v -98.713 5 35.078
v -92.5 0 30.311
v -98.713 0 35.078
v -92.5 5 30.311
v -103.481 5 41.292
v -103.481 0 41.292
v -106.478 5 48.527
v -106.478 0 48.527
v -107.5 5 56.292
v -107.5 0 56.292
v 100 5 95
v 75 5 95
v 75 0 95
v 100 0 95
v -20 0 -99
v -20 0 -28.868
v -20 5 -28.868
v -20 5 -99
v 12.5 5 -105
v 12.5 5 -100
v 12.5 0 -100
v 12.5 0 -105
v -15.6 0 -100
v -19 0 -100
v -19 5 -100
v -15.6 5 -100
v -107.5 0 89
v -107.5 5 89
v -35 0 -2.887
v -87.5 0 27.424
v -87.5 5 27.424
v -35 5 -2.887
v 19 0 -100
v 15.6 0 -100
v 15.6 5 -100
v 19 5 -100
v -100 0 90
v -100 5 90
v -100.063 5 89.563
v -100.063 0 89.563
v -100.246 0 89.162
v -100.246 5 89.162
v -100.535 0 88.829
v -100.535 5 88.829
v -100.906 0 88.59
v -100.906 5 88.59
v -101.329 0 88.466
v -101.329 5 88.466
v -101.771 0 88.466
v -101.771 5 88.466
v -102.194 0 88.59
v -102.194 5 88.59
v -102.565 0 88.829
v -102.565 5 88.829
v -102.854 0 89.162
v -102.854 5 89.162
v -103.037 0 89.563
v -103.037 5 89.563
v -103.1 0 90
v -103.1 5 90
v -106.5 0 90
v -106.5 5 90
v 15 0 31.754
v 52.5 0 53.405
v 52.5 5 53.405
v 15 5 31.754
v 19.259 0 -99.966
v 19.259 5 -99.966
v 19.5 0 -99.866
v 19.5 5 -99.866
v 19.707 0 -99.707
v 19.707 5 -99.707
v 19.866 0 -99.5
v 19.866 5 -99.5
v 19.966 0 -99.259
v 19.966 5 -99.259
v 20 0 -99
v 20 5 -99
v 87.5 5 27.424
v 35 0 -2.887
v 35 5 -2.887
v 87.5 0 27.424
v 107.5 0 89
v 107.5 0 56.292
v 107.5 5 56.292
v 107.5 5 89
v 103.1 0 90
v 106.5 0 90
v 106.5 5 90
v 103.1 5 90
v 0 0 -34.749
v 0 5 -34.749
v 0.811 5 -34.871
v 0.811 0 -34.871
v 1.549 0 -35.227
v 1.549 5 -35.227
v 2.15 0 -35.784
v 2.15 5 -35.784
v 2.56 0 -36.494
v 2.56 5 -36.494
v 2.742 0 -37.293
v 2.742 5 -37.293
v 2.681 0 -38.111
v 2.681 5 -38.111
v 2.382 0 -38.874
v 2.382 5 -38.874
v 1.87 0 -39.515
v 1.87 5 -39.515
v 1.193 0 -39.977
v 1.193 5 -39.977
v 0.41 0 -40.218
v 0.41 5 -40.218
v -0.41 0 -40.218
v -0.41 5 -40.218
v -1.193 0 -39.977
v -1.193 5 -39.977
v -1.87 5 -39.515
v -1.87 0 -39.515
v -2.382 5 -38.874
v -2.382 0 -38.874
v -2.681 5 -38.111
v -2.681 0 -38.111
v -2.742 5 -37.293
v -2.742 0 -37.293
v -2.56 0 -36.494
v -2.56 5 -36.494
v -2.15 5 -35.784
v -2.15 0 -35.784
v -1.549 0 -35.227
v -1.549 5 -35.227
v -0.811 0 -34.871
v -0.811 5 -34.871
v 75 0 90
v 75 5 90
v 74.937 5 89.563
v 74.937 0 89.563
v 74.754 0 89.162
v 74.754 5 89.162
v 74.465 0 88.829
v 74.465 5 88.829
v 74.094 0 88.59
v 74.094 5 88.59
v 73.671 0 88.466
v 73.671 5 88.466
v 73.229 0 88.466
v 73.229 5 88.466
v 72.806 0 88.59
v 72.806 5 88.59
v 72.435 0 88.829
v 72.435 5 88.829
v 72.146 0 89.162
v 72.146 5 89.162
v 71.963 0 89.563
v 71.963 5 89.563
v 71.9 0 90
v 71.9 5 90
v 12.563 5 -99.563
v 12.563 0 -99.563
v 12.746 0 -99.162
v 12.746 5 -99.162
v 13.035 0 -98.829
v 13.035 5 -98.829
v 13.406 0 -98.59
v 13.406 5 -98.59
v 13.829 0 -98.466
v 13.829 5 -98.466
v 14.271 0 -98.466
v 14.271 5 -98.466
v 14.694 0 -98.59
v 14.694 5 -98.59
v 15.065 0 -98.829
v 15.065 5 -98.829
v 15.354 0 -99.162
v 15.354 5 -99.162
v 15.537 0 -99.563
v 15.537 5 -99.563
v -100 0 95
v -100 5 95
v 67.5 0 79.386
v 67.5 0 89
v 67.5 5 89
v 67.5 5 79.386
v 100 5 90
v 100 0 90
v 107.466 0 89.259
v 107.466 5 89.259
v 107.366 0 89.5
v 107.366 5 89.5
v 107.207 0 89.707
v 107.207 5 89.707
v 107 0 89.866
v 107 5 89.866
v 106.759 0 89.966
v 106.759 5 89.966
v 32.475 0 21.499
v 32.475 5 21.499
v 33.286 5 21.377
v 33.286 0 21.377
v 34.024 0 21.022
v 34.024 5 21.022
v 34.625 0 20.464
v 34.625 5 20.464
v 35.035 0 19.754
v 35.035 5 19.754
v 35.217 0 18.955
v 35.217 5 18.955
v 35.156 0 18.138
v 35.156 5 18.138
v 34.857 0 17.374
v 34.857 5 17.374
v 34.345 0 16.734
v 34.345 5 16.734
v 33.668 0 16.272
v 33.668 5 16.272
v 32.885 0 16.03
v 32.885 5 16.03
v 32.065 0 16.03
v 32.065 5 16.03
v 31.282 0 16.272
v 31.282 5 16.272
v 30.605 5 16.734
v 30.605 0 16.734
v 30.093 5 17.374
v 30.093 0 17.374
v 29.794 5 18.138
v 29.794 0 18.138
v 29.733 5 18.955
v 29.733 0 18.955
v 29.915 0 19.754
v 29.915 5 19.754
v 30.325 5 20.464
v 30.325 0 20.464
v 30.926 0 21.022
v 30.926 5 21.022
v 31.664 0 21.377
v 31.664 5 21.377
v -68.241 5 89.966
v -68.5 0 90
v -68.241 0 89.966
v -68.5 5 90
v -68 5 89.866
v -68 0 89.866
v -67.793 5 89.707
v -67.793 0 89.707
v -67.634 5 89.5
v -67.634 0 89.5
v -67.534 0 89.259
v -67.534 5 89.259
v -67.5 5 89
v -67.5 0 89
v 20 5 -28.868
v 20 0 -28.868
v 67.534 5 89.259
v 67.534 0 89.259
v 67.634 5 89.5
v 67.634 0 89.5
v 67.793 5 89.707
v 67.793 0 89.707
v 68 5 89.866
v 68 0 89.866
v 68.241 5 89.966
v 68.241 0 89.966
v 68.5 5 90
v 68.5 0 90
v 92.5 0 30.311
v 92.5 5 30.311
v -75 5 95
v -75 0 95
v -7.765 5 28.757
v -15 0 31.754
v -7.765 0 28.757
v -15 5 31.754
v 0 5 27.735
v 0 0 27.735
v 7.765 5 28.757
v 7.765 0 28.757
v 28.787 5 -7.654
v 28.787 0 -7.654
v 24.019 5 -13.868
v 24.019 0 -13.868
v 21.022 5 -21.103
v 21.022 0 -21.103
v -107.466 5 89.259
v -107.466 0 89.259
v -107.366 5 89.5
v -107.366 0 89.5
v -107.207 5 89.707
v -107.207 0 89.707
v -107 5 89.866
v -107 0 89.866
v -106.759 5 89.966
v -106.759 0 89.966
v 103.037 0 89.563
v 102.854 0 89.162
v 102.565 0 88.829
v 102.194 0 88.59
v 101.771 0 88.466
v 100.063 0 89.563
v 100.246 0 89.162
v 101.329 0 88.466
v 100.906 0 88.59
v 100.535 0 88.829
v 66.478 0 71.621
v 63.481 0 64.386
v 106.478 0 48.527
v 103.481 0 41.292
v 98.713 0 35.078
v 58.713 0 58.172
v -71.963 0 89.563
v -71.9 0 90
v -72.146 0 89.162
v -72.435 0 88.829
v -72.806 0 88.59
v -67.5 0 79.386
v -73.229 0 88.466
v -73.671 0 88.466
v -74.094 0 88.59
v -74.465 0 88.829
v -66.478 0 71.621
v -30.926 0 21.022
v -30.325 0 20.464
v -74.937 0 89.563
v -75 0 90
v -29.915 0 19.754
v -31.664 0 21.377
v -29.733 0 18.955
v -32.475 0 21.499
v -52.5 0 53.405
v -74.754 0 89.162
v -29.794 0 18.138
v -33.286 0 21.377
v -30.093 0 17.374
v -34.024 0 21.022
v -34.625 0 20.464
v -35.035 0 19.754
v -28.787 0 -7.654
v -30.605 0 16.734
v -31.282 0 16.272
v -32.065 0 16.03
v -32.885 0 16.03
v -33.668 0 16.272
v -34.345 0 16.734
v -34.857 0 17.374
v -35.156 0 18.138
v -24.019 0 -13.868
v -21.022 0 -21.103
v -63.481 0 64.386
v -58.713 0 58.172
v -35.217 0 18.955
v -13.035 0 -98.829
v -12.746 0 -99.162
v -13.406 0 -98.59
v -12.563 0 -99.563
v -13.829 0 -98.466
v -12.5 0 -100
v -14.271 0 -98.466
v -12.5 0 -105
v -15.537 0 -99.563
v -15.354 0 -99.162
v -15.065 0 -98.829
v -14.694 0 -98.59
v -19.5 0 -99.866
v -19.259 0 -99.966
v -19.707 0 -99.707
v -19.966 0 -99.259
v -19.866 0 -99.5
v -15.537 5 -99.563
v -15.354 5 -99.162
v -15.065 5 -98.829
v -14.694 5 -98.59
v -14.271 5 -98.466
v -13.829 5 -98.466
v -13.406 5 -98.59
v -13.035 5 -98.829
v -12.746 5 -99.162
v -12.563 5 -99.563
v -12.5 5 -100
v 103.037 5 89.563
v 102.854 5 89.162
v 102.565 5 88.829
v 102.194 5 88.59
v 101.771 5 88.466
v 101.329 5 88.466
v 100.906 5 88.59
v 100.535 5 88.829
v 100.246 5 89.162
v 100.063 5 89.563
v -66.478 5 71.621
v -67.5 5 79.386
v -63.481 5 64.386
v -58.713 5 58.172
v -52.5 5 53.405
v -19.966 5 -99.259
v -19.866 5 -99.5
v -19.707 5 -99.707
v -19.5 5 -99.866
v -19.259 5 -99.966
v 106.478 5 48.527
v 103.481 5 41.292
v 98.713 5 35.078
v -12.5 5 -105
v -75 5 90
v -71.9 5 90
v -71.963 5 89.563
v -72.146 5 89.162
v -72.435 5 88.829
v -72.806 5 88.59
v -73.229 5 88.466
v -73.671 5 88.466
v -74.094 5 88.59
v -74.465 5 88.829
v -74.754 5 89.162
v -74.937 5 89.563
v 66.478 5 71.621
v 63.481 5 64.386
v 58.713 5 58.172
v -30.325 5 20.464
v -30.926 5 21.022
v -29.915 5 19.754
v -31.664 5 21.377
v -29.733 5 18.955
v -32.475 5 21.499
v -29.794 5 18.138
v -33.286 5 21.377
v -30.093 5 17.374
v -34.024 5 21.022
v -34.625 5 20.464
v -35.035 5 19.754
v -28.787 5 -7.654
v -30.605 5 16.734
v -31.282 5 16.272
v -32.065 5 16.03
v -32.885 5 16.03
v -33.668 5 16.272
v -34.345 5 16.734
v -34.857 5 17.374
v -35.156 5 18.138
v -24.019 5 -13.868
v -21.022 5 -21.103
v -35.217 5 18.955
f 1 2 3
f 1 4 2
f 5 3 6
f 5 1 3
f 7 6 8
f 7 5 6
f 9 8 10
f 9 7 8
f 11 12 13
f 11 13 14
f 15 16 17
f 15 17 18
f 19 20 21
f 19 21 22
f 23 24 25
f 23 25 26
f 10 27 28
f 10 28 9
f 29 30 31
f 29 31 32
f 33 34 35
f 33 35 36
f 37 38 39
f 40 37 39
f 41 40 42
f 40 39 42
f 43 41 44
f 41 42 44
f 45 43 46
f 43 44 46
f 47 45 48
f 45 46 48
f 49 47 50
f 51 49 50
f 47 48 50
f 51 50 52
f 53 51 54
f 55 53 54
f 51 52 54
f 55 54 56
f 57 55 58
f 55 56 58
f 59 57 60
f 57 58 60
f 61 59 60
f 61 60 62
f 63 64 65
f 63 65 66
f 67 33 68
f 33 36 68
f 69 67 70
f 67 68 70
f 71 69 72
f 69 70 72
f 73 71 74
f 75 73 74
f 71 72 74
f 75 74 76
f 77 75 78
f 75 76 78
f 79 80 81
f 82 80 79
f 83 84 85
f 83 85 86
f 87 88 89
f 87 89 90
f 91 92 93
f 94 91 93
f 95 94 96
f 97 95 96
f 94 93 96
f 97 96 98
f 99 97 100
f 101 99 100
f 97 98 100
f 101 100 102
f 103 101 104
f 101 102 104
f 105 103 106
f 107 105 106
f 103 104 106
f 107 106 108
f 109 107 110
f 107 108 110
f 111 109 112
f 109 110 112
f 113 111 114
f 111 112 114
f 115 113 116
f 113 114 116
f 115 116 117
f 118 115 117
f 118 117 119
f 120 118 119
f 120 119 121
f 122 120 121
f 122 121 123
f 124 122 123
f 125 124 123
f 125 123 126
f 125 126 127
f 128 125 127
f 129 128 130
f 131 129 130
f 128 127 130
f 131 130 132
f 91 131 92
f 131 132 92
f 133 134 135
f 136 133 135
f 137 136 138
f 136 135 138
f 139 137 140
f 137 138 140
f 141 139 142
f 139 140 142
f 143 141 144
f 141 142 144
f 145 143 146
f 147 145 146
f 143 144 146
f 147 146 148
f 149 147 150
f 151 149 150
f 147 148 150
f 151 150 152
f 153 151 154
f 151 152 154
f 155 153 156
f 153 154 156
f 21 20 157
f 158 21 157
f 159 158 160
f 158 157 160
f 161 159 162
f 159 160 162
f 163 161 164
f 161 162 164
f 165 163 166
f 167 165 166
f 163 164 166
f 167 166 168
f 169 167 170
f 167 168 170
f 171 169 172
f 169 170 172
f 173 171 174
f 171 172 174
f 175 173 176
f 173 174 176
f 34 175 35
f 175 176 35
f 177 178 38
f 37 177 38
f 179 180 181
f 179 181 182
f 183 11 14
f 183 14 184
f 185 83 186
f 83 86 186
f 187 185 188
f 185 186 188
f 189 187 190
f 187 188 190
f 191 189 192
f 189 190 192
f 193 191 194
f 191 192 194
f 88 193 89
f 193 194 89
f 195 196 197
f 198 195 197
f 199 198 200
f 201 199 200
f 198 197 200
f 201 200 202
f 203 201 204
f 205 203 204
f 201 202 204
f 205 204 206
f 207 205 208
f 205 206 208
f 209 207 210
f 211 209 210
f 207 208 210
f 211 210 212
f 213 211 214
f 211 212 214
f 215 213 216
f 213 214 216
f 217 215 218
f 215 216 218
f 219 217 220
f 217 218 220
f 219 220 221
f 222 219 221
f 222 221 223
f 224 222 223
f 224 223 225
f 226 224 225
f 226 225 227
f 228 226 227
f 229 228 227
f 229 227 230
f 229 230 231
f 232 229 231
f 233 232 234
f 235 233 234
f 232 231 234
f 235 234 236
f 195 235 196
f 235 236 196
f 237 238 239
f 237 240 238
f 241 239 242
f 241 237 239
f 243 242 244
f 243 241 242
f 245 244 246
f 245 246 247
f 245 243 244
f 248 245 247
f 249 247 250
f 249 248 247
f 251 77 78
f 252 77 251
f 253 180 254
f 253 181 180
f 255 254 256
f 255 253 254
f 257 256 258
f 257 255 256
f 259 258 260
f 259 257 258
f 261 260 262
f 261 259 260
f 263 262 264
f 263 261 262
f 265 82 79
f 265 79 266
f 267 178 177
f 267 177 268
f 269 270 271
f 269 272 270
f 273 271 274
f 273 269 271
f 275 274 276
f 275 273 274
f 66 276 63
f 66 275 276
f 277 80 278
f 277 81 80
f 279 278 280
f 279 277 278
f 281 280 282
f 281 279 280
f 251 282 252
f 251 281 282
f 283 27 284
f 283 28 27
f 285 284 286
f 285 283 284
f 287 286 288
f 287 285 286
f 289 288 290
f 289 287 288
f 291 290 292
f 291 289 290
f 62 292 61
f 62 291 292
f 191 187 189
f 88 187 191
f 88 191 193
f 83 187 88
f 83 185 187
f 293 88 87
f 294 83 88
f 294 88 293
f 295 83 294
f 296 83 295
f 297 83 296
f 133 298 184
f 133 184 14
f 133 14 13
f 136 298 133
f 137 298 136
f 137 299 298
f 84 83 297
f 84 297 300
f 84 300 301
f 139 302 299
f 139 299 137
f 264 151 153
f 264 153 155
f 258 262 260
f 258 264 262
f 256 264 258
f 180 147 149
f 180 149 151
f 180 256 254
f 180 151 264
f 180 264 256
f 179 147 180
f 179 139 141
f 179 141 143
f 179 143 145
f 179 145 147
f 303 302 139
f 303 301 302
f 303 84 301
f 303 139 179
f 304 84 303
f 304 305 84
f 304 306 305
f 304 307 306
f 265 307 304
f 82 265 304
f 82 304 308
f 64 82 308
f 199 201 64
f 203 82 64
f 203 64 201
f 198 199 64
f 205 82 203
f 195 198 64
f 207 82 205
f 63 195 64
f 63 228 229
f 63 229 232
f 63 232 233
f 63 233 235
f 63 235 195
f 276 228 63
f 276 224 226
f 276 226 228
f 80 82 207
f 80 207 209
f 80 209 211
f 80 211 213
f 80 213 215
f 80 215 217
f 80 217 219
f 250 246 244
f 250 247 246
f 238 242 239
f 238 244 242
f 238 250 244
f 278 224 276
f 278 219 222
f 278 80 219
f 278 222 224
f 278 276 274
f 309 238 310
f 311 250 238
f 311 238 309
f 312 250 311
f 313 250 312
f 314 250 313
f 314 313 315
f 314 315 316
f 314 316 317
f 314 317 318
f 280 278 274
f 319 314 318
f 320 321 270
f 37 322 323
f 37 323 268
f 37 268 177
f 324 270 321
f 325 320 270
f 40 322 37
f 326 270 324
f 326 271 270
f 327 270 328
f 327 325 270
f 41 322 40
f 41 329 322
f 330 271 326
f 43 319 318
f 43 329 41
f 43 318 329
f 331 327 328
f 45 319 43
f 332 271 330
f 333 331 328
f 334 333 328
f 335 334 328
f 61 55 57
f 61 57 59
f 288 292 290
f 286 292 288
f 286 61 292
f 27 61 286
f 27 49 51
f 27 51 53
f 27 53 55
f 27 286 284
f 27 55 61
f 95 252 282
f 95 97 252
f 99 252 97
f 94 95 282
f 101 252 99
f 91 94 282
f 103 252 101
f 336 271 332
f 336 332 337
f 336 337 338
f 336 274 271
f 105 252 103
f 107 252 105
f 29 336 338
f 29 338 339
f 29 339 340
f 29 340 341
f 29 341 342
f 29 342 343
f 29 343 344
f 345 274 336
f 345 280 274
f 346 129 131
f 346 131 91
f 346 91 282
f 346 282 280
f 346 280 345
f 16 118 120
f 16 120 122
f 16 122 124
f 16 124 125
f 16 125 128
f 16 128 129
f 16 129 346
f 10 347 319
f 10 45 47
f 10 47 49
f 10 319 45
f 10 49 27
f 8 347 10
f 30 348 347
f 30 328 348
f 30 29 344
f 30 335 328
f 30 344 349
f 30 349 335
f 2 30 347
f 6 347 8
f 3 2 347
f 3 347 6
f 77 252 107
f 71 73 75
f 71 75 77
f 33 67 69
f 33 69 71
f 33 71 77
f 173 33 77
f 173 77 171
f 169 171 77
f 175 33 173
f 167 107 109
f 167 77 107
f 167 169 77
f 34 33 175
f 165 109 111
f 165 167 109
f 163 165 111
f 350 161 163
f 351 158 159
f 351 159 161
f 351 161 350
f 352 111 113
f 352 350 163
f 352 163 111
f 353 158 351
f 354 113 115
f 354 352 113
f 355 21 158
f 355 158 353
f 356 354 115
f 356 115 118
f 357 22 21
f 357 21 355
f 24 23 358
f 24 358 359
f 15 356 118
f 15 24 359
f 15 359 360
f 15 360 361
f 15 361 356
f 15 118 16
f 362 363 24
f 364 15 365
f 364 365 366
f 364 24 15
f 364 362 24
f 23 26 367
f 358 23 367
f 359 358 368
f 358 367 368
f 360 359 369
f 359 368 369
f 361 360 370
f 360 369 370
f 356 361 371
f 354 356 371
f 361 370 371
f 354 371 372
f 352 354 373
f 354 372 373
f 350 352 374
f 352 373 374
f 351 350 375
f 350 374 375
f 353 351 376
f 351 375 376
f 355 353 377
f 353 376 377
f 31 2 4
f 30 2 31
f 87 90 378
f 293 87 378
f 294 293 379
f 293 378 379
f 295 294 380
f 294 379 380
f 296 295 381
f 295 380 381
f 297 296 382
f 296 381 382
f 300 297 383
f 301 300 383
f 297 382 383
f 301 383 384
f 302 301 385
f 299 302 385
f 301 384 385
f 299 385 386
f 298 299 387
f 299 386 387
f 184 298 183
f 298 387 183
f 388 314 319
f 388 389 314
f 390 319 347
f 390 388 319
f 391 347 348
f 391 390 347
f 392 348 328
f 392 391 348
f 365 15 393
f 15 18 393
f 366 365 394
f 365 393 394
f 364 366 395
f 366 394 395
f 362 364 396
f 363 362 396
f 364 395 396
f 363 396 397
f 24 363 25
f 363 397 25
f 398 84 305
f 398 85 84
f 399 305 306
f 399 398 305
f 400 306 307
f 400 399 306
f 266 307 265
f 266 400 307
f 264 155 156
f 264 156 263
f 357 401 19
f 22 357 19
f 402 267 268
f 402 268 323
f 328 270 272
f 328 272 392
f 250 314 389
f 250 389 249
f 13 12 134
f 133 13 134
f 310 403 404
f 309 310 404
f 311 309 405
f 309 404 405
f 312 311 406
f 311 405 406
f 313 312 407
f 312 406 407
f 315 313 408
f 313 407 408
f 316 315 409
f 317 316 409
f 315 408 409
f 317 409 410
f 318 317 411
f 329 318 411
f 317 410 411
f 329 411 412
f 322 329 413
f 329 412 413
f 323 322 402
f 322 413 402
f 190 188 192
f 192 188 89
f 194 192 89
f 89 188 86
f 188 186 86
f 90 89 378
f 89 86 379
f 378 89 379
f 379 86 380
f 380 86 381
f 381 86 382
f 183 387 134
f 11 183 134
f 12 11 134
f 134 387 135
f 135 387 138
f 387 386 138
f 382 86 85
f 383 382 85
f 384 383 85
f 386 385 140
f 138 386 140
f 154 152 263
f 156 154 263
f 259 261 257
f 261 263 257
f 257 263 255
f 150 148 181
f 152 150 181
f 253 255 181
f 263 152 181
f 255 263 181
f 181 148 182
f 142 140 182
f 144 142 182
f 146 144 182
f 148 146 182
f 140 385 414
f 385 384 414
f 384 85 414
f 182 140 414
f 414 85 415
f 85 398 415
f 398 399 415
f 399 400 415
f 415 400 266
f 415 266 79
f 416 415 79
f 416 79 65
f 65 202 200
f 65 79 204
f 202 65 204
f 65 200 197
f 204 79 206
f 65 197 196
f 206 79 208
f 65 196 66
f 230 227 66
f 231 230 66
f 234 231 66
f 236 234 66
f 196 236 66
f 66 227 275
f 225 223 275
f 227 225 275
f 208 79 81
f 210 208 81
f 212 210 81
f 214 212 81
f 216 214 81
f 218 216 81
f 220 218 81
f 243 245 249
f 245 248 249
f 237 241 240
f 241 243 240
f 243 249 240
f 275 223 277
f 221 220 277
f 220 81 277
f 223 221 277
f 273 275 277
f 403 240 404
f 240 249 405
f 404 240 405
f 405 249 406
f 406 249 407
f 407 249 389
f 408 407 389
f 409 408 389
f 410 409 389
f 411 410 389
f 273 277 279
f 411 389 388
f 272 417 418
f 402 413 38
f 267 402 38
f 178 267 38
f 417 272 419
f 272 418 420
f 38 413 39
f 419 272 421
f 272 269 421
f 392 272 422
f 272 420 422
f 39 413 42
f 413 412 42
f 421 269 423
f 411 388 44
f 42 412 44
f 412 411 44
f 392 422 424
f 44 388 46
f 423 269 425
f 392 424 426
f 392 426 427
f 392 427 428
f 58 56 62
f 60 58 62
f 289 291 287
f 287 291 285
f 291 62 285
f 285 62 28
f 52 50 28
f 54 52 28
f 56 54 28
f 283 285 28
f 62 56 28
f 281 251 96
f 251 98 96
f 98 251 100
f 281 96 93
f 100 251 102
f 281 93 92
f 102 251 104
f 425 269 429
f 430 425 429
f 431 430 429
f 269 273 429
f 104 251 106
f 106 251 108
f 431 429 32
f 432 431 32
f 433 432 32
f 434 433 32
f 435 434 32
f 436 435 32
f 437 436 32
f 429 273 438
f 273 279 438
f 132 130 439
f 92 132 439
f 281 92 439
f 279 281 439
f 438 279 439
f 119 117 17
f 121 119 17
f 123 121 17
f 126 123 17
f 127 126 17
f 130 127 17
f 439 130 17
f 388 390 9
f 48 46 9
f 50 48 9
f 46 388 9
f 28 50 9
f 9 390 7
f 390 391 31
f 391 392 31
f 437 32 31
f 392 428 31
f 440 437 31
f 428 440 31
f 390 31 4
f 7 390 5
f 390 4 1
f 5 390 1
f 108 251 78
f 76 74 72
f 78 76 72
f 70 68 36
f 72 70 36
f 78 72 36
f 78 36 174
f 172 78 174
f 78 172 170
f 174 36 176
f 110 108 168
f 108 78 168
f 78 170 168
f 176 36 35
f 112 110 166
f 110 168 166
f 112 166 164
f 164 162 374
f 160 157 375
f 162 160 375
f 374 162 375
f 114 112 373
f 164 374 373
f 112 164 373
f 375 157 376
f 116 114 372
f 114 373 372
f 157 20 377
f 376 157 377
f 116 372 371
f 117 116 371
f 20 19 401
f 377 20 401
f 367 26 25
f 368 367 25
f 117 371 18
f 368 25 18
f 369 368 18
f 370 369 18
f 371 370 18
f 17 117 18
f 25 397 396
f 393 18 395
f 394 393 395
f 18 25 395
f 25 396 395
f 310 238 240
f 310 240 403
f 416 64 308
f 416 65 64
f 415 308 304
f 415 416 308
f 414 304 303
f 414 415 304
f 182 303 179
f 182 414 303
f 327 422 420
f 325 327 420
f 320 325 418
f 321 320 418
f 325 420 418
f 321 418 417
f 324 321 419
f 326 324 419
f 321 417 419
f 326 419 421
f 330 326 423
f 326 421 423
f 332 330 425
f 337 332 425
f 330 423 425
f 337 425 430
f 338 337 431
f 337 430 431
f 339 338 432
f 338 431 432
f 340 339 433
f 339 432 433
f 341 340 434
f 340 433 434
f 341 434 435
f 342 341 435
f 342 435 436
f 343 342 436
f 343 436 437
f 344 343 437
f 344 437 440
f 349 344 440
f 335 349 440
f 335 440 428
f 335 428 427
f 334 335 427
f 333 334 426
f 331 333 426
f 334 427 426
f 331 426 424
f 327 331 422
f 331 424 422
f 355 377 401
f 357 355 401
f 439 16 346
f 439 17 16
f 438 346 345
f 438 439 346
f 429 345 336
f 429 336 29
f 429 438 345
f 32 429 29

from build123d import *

# Parameters (mm, degrees)
EXTRUDE_1_DEPTH     = 5
SKETCH_3_R          = 2.75
CUT_EXTRUDE_1_DEPTH = 5
SKETCH_4_W          = 25
SKETCH_4_H          = 5
EXTRUDE_2_DEPTH     = 5
SKETCH_5_R          = 1.55
CUT_EXTRUDE_2_DEPTH = 5
FILLET_1_R          = 30
FILLET_2_R          = 1


with BuildPart() as part:
    # 草图1 → 凸台-拉伸1 (new body)
    with BuildSketch(Plane(origin=(0, 0, 0), x_dir=(1, 0, 0), z_dir=(0, 1, 0))):
        Polygon((-20, 100), (20, 100), (20, 11.547005384), (87.5, -27.424137787), (107.5, -38.97114317), (107.5, -90), (67.5, -90), (67.5, -62.065153938), (0, -23.094010768), (-67.5, -62.065153938), (-67.5, -90), (-107.5, -90), (-107.5, -38.97114317), (-87.5, -27.424137787), (-20, 11.547005384), align=None)
    extrude(amount=EXTRUDE_1_DEPTH)

    # 草图3 → 切除-拉伸1 (cut)
    with BuildSketch(Plane(origin=(0, 5, 0), x_dir=(1, 0, 0), z_dir=(0, 1, 0))):
        with Locations(Location((0, 37.498899984, 0), (0, 0, 270))):
            Circle(SKETCH_3_R)
        with Locations(Location((32.475, -18.749449992, 0), (0, 0, 270))):
            Circle(SKETCH_3_R)
        with Locations(Location((-32.475, -18.749449992, 0), (0, 0, 270))):
            Circle(SKETCH_3_R)
    extrude(amount=-CUT_EXTRUDE_1_DEPTH, mode=Mode.SUBTRACT)

    # 草图4 → 凸台-拉伸2 (add)
    with BuildSketch(Plane(origin=(0, 5, 0), x_dir=(1, 0, 0), z_dir=(0, 1, 0))):
        with Locations((-87.5, -92.5)):
            Rectangle(SKETCH_4_W, SKETCH_4_H)
        with Locations((87.5, -92.5)):
            Rectangle(SKETCH_4_W, SKETCH_4_H)
        with Locations((0, 102.5)):
            Rectangle(SKETCH_4_W, SKETCH_4_H)
    extrude(amount=-EXTRUDE_2_DEPTH)

    # 草图5 → 切除-拉伸2 (cut)
    with BuildSketch(Plane(origin=(0, 5, 0), x_dir=(1, 0, 0), z_dir=(0, 1, 0))):
        with Locations((14.05, 100)):
            Circle(SKETCH_5_R)
        with Locations((-14.05, 100)):
            Circle(SKETCH_5_R)
        with Locations((-73.45, -90)):
            Circle(SKETCH_5_R)
        with Locations((-101.55, -90)):
            Circle(SKETCH_5_R)
        with Locations((101.55, -90)):
            Circle(SKETCH_5_R)
        with Locations((73.45, -90)):
            Circle(SKETCH_5_R)
    extrude(amount=-CUT_EXTRUDE_2_DEPTH, mode=Mode.SUBTRACT)

    # 圆角1
    fillet_1_edges = [part.edges().sort_by_distance(p)[0] for p in [
        (-20, 2.5, -11.547005384),
        (20, 2.5, -11.547005384),
        (107.5, 2.5, 38.97114317),
        (67.5, 2.5, 62.065153938),
        (0, 2.5, 23.094010768),
        (-67.5, 2.5, 62.065153938),
        (-107.5, 2.5, 38.97114317),
    ]]
    fillet(fillet_1_edges, radius=FILLET_1_R)

    # 圆角2
    fillet_2_edges = [part.edges().sort_by_distance(p)[0] for p in [
        (-20, 2.5, -100),
        (20, 2.5, -100),
        (107.5, 2.5, 90),
        (67.5, 2.5, 90),
        (-67.5, 2.5, 90),
        (-107.5, 2.5, 90),
    ]]
    fillet(fillet_2_edges, radius=FILLET_2_R)


solid = part.part
